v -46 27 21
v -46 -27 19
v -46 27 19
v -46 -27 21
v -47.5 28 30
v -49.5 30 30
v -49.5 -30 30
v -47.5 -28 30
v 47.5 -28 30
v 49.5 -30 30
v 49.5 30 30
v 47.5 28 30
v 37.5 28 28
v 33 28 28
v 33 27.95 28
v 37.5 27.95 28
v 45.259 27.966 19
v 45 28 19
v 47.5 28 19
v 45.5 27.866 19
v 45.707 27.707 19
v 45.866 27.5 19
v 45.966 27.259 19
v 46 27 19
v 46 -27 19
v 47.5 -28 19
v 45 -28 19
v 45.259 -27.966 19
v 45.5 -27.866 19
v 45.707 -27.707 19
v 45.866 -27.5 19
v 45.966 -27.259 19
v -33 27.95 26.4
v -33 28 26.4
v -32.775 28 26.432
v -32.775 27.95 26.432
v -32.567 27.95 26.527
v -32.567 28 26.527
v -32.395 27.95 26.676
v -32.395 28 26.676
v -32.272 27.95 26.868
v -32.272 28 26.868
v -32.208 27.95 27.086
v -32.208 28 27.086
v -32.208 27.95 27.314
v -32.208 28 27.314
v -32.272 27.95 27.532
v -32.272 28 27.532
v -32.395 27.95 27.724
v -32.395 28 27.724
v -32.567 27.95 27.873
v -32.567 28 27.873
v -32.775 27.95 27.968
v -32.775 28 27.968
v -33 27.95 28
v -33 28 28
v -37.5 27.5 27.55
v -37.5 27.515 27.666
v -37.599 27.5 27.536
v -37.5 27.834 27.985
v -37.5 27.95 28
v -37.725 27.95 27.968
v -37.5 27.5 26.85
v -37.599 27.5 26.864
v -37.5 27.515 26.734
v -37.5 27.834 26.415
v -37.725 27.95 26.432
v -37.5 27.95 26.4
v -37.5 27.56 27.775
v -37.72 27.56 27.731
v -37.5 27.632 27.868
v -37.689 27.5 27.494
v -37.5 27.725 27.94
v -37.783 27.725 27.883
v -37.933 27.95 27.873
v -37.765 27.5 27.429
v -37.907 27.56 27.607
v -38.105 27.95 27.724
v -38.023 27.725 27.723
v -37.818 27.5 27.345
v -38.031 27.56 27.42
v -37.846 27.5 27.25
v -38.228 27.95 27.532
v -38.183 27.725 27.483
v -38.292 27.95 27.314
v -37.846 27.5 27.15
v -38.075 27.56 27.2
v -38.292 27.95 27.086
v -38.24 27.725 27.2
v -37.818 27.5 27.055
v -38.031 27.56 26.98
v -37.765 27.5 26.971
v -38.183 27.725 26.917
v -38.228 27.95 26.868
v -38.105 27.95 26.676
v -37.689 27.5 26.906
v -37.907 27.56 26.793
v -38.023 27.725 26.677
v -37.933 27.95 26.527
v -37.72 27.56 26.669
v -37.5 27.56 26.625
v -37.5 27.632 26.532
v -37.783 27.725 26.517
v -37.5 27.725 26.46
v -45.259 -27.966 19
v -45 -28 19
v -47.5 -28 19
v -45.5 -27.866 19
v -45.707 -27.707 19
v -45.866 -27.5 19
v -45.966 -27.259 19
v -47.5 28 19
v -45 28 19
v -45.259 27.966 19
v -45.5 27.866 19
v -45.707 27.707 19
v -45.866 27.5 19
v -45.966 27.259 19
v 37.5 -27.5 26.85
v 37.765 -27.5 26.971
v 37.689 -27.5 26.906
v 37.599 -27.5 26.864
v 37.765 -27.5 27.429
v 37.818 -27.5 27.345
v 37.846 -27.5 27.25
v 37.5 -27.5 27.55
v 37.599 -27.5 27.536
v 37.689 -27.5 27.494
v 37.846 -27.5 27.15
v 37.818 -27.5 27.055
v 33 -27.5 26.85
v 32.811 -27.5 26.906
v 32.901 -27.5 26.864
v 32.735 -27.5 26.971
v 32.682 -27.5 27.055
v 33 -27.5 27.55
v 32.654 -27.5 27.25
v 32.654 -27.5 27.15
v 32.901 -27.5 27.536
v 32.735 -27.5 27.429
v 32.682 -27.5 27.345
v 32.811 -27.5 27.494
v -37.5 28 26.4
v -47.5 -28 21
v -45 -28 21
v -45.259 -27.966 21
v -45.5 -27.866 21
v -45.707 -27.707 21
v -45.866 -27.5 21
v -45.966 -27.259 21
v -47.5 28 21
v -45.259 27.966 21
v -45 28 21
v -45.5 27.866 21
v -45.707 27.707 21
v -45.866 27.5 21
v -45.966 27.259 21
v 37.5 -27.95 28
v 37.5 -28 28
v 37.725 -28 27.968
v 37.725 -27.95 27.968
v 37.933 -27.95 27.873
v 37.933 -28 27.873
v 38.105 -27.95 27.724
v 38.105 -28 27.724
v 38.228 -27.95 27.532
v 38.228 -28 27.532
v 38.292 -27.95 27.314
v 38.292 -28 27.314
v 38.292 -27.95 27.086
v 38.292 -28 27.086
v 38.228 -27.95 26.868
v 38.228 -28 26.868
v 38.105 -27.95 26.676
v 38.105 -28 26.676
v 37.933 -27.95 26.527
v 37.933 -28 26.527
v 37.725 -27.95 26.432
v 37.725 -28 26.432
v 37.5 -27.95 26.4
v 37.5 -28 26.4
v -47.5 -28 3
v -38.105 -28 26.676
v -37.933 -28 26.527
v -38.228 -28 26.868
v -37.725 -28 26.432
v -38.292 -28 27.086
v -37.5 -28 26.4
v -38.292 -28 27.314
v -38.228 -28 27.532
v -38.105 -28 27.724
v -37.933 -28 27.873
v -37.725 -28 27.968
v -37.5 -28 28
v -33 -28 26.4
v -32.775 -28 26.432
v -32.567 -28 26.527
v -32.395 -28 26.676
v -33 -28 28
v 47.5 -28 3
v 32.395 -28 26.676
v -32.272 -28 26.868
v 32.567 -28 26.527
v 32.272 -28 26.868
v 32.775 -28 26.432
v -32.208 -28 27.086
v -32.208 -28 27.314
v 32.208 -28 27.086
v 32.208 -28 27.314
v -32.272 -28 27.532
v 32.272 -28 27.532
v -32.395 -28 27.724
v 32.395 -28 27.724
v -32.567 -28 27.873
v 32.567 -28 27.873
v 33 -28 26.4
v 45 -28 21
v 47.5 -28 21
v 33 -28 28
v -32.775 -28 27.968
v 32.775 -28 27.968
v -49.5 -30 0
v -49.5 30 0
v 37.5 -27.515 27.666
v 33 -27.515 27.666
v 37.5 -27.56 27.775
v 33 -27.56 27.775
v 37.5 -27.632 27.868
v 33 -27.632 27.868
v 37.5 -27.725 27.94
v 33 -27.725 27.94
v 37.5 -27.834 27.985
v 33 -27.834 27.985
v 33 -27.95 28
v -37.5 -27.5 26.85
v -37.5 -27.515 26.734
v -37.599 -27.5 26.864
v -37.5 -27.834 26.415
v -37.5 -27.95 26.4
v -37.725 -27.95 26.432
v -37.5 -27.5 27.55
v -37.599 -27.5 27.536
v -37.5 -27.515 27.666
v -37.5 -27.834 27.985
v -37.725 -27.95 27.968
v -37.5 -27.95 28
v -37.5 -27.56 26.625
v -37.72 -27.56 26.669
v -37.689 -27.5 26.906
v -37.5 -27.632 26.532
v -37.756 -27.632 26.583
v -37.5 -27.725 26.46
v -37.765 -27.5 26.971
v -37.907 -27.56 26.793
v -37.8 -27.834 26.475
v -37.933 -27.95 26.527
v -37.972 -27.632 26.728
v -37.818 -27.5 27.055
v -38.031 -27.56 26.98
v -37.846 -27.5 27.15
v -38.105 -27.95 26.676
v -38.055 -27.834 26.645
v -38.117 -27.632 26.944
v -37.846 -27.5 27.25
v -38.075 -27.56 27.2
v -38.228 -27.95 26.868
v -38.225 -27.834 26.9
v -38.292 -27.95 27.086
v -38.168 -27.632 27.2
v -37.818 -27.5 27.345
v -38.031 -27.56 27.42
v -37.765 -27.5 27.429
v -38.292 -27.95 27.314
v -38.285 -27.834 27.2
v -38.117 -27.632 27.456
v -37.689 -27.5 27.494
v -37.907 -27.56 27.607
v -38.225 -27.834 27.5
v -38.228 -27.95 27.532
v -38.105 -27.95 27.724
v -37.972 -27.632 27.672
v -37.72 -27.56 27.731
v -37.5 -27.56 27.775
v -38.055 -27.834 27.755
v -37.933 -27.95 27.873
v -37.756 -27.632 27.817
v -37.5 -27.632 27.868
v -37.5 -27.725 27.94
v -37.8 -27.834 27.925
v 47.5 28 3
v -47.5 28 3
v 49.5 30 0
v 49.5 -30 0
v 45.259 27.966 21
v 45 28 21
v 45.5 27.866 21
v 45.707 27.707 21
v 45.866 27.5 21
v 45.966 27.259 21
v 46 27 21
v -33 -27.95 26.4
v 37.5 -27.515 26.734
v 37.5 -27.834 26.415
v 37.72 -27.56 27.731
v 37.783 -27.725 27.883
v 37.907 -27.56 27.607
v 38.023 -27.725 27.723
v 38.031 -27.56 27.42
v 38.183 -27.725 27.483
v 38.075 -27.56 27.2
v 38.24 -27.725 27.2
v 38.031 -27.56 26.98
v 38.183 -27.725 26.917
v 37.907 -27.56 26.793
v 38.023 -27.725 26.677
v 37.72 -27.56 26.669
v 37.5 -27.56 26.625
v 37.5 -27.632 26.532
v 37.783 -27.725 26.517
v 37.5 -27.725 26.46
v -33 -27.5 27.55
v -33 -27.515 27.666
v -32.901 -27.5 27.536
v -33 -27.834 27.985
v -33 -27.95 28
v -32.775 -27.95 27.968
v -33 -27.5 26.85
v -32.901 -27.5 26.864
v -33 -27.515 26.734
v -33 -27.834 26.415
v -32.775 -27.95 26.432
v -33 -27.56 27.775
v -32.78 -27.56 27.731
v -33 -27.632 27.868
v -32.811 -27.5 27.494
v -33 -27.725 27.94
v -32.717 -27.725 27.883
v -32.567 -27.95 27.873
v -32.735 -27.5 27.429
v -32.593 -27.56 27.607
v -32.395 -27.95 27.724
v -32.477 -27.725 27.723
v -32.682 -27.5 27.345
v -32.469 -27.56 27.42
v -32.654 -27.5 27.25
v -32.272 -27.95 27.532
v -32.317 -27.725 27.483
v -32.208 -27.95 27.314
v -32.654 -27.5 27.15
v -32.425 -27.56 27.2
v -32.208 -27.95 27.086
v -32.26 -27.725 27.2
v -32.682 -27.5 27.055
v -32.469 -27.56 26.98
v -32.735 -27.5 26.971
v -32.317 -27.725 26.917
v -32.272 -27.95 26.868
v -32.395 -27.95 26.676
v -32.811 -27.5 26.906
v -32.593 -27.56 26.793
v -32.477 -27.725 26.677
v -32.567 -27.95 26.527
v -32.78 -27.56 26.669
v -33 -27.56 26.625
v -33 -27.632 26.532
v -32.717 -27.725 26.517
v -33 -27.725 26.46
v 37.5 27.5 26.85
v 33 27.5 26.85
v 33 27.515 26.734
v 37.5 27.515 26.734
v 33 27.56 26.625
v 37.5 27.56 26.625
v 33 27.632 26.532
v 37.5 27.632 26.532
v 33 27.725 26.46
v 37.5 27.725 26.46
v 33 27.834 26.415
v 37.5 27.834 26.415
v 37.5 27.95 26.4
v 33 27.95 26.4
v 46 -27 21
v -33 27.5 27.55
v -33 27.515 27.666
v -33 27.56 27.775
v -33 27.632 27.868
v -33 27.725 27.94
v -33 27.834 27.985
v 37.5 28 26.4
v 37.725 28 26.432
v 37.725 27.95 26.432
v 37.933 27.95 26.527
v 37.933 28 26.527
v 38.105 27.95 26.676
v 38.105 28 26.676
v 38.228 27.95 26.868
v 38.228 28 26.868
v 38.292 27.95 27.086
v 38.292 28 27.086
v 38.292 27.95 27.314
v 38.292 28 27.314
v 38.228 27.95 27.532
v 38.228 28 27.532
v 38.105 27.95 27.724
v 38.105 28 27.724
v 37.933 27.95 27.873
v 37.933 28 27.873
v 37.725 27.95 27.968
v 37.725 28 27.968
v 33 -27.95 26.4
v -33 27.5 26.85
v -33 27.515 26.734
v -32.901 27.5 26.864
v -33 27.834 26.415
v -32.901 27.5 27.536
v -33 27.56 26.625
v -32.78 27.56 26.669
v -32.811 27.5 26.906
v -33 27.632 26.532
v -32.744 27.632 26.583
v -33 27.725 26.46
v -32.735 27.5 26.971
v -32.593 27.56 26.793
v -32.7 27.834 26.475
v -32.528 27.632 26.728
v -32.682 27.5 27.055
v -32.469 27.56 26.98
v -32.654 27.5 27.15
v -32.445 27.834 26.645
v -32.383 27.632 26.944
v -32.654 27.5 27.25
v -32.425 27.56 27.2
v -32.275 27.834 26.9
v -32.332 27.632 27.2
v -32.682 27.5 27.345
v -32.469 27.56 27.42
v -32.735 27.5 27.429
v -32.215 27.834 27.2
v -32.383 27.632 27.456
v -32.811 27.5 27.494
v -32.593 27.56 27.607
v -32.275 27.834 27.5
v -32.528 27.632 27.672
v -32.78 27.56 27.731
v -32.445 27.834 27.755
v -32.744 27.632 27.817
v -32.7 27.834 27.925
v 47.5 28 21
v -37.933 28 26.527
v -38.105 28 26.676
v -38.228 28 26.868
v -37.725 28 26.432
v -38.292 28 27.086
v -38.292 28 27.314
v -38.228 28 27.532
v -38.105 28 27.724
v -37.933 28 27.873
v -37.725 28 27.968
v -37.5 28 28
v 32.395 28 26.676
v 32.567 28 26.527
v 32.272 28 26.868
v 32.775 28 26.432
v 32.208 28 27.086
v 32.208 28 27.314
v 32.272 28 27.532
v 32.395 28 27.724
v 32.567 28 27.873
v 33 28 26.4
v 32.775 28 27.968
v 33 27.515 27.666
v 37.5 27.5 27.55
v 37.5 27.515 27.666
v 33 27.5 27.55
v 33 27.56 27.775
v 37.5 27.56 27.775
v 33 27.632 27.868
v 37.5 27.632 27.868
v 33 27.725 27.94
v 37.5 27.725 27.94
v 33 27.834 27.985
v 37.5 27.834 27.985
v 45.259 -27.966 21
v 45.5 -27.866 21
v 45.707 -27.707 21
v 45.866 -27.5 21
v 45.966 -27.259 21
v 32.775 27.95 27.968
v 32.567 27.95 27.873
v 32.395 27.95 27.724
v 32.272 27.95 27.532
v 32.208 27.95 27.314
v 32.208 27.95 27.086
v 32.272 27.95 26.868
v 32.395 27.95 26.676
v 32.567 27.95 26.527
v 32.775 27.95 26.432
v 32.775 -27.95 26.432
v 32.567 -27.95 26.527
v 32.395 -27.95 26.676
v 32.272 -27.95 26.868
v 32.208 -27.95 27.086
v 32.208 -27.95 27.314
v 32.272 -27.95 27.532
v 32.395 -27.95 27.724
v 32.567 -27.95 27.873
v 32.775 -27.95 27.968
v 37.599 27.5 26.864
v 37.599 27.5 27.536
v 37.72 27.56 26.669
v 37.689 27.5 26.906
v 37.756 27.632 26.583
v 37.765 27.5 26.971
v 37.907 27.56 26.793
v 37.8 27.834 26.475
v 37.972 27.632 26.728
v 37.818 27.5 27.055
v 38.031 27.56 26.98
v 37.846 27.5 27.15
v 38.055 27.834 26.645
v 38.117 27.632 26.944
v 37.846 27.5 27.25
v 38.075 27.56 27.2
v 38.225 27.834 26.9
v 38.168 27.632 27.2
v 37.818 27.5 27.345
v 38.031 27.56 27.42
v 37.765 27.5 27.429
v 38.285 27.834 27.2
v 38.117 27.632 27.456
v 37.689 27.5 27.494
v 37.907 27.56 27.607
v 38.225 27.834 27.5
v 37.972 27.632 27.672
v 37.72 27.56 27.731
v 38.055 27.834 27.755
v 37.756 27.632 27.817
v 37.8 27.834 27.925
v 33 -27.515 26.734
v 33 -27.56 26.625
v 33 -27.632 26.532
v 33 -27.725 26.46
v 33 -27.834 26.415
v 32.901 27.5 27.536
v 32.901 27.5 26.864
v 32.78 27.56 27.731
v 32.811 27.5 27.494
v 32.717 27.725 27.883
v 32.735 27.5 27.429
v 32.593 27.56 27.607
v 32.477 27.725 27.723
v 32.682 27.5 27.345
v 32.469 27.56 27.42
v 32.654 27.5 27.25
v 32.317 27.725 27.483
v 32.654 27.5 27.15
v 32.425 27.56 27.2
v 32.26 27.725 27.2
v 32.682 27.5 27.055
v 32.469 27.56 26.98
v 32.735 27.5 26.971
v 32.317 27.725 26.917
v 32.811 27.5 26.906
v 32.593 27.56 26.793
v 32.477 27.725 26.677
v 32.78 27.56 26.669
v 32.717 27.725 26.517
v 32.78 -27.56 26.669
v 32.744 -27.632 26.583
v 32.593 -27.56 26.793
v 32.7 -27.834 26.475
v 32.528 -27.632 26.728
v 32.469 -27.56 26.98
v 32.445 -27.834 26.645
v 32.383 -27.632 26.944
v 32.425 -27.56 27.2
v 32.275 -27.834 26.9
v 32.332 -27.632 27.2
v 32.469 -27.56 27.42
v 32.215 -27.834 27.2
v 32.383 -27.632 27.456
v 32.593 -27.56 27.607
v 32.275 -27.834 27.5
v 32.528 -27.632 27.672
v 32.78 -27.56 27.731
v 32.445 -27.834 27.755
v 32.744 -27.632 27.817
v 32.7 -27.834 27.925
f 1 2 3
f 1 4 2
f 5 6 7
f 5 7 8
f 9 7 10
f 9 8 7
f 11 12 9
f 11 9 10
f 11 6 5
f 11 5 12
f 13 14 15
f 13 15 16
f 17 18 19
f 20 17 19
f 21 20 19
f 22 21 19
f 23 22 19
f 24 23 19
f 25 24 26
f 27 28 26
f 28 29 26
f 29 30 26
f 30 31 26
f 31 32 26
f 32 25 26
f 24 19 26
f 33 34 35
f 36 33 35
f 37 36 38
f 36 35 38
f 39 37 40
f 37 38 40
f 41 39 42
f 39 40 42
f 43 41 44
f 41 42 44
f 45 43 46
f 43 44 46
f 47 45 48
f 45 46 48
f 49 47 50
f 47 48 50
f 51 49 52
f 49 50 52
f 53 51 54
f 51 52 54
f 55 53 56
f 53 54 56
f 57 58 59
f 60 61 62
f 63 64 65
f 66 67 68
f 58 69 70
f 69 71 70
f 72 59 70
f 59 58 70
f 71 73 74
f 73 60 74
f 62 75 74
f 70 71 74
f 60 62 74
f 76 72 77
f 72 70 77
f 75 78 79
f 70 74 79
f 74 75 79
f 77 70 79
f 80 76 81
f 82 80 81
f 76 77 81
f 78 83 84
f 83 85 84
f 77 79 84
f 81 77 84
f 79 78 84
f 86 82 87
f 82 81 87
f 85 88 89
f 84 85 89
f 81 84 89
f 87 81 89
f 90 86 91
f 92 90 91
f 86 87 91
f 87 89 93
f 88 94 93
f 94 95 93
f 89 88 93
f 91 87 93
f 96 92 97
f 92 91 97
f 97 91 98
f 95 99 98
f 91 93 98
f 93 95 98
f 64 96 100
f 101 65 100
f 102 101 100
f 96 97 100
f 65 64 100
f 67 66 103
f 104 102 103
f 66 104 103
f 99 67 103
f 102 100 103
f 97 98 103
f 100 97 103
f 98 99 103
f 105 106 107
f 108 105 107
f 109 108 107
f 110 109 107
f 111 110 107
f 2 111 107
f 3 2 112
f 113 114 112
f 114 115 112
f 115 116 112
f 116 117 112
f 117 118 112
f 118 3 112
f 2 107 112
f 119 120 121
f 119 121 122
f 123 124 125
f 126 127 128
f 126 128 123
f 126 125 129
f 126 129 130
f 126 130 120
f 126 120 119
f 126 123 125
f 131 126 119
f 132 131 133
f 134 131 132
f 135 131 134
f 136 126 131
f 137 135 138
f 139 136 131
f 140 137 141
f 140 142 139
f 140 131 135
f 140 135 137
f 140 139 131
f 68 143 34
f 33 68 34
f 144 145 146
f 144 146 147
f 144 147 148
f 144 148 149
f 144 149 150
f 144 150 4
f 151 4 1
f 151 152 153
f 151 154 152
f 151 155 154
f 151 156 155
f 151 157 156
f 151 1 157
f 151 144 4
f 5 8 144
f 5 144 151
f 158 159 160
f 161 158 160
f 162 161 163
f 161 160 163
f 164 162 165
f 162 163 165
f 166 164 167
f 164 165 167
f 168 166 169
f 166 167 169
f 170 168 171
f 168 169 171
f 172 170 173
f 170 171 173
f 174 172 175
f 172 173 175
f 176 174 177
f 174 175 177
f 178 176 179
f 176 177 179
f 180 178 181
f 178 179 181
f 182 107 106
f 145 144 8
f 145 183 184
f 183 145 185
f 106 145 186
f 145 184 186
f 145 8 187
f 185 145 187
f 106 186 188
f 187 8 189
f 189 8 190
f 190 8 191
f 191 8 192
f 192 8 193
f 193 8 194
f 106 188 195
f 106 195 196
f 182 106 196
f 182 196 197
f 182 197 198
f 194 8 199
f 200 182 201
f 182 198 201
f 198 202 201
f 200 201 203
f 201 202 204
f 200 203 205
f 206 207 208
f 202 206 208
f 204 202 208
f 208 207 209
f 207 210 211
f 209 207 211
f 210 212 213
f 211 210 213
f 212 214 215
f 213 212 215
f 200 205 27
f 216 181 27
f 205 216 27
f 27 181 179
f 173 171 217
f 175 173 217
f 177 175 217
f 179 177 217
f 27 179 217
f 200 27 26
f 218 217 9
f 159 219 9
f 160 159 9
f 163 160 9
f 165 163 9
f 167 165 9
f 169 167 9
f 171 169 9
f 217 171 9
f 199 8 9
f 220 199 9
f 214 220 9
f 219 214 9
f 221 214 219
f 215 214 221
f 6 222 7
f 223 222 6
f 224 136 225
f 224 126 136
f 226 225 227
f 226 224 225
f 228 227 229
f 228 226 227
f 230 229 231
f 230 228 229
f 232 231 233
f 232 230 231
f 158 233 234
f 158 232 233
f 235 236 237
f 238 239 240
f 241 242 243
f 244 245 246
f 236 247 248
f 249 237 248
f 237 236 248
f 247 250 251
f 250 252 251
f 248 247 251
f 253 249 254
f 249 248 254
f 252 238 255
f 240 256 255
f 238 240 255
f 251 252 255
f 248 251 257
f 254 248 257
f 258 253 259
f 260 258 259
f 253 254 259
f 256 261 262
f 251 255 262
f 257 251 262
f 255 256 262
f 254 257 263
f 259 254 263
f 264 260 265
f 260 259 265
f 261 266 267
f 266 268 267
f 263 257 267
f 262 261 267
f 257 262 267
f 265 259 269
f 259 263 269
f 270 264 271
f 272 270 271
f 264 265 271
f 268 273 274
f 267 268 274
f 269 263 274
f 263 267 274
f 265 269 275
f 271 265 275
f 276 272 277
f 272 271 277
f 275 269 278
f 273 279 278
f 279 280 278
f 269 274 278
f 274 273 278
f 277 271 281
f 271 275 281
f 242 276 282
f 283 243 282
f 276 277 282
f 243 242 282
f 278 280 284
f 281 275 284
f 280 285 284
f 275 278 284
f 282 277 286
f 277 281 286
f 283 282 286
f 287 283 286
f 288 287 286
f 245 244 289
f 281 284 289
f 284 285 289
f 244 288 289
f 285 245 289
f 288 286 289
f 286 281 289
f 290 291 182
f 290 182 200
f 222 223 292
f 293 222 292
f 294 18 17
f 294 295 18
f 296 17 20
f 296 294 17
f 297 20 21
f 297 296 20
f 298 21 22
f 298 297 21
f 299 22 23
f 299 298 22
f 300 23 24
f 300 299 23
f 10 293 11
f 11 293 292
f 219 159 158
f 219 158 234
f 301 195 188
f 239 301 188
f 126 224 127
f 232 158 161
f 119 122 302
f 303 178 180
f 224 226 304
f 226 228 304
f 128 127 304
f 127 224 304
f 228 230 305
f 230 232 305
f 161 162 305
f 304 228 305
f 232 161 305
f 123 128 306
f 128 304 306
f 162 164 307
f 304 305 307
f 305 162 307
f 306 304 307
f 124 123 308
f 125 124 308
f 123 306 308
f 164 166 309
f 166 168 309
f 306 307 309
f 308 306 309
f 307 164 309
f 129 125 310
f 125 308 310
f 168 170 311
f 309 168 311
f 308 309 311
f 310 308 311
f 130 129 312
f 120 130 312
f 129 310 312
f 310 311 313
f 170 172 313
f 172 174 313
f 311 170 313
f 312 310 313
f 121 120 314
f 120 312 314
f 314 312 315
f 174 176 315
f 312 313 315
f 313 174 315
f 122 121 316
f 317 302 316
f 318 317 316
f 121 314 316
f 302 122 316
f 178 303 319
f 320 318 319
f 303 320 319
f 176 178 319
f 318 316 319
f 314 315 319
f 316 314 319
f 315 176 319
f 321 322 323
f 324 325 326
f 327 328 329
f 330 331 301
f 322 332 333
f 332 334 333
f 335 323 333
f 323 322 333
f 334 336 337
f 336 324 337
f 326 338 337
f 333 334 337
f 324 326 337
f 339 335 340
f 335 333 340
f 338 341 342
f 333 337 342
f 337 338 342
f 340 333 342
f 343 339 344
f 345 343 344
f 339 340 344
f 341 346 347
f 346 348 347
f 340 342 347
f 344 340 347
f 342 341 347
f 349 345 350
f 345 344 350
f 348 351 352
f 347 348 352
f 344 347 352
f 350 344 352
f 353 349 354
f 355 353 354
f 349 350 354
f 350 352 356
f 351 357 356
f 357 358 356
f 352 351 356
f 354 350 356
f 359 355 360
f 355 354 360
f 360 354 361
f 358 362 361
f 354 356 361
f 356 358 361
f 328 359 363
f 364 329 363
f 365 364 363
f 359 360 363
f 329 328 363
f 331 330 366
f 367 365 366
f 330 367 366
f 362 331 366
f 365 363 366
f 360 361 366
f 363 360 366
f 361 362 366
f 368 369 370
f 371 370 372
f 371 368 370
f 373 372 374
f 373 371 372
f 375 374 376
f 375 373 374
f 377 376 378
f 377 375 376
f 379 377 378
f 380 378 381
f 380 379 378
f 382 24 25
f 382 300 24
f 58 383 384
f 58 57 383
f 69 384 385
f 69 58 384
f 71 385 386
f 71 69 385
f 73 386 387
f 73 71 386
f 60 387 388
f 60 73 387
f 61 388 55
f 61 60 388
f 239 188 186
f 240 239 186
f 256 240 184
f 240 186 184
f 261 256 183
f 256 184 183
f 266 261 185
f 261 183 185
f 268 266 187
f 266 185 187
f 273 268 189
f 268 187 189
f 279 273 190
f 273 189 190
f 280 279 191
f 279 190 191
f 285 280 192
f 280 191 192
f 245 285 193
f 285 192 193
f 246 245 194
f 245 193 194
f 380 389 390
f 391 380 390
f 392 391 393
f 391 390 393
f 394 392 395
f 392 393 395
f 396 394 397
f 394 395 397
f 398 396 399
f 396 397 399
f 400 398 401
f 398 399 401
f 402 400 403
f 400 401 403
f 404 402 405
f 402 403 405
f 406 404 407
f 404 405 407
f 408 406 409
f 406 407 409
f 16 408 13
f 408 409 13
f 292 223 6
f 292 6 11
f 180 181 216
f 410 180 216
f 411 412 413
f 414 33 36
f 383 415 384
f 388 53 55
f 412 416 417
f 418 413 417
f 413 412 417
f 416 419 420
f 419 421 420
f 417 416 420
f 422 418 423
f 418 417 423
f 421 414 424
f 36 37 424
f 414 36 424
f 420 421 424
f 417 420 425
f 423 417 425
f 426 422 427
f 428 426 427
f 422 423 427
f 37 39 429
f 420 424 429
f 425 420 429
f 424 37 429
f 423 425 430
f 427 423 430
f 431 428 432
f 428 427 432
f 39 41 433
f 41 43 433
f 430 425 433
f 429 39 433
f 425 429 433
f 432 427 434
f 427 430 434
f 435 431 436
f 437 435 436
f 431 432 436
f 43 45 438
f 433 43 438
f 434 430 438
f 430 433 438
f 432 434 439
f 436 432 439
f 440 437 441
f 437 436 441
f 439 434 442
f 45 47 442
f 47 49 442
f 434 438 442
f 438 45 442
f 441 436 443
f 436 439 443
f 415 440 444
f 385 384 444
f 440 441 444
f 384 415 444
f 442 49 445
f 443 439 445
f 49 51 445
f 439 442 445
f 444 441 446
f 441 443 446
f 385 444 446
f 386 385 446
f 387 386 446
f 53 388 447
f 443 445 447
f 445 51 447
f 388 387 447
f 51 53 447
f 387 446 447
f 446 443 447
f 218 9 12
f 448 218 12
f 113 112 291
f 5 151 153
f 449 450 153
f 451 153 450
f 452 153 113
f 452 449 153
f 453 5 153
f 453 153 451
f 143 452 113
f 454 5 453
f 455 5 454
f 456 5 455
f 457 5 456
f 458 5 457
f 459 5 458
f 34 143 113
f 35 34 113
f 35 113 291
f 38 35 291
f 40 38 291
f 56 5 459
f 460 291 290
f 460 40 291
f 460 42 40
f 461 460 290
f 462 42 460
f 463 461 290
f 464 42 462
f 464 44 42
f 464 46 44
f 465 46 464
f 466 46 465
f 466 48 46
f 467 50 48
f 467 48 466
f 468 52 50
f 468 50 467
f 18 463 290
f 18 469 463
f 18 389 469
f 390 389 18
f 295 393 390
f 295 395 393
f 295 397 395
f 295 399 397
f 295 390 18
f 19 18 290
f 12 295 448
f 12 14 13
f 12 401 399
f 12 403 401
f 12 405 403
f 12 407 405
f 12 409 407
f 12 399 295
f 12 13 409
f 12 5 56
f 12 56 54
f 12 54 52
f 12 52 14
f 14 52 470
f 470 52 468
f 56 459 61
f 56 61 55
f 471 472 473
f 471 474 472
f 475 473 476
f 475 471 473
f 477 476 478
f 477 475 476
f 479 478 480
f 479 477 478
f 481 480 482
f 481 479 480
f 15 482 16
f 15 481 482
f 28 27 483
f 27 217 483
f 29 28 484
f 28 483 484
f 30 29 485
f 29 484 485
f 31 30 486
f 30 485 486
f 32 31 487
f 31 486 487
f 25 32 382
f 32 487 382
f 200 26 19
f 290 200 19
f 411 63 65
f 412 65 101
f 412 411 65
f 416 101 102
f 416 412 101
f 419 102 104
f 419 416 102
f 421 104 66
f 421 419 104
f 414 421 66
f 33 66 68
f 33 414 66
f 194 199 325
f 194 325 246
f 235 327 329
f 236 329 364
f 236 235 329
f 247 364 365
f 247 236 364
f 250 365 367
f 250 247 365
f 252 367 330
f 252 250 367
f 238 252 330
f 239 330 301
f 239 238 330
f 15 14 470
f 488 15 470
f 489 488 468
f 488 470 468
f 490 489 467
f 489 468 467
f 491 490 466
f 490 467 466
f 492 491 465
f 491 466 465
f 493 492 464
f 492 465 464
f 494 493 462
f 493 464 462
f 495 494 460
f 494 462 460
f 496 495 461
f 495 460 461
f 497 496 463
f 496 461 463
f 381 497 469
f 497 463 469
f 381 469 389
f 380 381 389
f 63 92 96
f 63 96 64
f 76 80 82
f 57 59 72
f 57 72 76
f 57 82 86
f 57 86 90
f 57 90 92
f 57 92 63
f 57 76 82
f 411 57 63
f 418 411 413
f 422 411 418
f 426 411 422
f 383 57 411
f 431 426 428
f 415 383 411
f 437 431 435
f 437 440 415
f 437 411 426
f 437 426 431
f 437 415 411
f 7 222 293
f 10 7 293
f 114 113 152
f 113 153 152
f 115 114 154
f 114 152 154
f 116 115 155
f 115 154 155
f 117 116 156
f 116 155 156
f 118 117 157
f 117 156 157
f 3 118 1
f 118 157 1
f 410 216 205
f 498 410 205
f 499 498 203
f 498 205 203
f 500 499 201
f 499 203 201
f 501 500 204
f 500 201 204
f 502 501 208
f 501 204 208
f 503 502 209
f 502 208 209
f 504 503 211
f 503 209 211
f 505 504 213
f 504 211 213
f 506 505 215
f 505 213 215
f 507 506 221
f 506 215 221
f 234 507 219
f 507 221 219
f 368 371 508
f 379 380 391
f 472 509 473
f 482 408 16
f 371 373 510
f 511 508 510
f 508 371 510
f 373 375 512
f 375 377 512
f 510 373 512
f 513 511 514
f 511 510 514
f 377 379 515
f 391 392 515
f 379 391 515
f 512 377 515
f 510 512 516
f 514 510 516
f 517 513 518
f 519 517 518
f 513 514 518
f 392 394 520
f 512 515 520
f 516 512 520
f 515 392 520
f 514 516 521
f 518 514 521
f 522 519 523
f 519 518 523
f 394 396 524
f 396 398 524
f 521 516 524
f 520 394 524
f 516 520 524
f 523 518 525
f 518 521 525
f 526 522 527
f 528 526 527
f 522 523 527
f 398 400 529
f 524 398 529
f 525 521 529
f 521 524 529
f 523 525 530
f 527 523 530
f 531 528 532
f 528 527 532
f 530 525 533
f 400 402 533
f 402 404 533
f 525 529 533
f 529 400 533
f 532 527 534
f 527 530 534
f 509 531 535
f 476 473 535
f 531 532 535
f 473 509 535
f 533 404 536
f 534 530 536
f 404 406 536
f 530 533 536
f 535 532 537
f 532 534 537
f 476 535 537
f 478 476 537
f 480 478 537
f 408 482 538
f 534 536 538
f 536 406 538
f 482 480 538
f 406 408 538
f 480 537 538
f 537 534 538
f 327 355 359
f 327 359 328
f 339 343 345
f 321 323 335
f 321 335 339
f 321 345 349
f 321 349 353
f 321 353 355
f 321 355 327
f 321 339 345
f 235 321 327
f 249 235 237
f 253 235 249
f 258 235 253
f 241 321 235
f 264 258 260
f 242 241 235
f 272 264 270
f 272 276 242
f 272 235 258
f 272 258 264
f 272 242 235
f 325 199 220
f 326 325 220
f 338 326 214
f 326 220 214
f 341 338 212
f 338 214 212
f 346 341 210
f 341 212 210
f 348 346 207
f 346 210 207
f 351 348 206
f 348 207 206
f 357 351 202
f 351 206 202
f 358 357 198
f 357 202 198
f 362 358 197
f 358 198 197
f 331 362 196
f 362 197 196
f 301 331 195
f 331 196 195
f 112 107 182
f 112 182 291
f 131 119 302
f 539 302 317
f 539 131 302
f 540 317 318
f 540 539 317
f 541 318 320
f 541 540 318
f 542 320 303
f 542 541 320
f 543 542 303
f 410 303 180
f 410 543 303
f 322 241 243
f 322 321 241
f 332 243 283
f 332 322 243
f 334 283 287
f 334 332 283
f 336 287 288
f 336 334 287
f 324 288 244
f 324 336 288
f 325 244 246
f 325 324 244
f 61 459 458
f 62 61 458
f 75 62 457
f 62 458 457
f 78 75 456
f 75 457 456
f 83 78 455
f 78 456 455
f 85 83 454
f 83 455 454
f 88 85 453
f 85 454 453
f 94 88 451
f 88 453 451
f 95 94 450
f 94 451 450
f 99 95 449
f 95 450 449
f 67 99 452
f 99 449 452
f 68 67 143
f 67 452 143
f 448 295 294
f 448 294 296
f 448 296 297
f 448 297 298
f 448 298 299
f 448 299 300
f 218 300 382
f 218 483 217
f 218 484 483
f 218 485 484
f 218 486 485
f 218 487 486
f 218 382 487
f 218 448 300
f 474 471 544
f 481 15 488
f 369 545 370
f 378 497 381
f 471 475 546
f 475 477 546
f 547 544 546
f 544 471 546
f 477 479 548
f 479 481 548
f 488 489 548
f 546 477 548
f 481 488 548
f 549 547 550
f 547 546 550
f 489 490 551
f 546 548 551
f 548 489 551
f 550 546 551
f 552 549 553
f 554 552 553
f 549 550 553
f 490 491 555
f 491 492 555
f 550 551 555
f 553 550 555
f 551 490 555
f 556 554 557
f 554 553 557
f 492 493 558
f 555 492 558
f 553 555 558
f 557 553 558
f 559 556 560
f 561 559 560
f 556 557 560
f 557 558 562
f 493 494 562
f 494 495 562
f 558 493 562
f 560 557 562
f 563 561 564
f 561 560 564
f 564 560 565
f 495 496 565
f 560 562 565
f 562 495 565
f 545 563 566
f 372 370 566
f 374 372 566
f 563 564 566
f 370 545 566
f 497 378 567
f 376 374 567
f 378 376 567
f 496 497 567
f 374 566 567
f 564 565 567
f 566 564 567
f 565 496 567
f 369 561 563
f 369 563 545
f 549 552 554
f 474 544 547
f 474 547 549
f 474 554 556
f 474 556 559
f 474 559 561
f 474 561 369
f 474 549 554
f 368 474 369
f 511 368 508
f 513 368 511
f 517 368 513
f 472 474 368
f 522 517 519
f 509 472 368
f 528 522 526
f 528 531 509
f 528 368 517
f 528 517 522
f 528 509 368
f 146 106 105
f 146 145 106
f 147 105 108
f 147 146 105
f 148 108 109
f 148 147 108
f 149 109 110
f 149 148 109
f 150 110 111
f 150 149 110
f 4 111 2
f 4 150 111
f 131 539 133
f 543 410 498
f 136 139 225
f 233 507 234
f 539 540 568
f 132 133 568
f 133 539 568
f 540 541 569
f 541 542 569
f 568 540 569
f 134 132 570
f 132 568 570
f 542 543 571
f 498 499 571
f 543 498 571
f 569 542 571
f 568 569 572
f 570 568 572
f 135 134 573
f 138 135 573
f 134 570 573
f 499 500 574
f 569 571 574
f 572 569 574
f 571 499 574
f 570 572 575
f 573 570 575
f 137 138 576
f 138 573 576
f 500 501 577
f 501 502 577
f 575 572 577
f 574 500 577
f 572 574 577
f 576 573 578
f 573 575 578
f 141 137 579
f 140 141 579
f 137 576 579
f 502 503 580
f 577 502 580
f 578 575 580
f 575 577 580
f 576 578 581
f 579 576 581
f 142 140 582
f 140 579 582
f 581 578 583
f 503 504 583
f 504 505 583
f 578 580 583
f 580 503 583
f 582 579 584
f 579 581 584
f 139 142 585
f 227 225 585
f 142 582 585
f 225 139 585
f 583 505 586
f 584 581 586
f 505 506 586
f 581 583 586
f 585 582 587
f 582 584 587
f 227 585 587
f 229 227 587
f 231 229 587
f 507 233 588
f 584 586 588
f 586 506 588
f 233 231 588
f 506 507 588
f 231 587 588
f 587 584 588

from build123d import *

# Parameters (mm, degrees)
SKETCH003_W     = 99
SKETCH003_H     = 60
PAD002_DEPTH    = 30
SKETCH004_W     = 95
SKETCH004_H     = 56
POCKET001_DEPTH = 27
PAD003_DEPTH    = 0.5
PAD004_DEPTH    = 0.5
SKETCH007_W     = 56
SKETCH007_H     = 2
PAD005_DEPTH    = 1.5
SKETCH008_W     = 56
SKETCH008_H     = 2
PAD006_DEPTH    = 1.5
FILLET_R        = 1
FILLET001_R     = 0.45


with BuildPart() as part:
    # Sketch003 → Pad002 (new body)
    with BuildSketch(Plane.XY):
        Rectangle(SKETCH003_W, SKETCH003_H)
    extrude(amount=PAD002_DEPTH)

    # Sketch004 (on Face6 of Pad002) → Pocket001 (cut)
    with BuildSketch(Plane.XY.offset(30)):
        Rectangle(SKETCH004_W, SKETCH004_H)
    extrude(amount=-POCKET001_DEPTH, mode=Mode.SUBTRACT)

    # Sketch005 (on Face8 of Pocket001) → Pad003 (join)
    with BuildSketch(Plane.XZ.offset(-28)):
        with BuildLine():
            ThreePointArc((-37.5, 28), (-38.3, 27.2), (-37.5, 26.4))
            Line((-37.5, 26.4), (-33, 26.4))
            ThreePointArc((-33, 26.4), (-32.2, 27.2), (-33, 28))
            Line((-37.5, 28), (-33, 28))
        make_face()
        with BuildLine():
            ThreePointArc((33, 28), (32.2, 27.2), (33, 26.4))
            Line((33, 26.4), (37.5, 26.4))
            ThreePointArc((37.5, 26.4), (38.3, 27.2), (37.5, 28))
            Line((33, 28), (37.5, 28))
        make_face()
    extrude(amount=PAD003_DEPTH)

    # Sketch006 (on Face10 of Pad003) → Pad004 (join)
    with BuildSketch(Plane(origin=(0, -28, 0), x_dir=(-1, 0, 0), z_dir=(0, 1, 0))):
        with BuildLine():
            ThreePointArc((-37.5, 28), (-38.3, 27.2), (-37.5, 26.4))
            Line((-37.5, 26.4), (-33, 26.4))
            ThreePointArc((-33, 26.4), (-32.2, 27.2), (-33, 28))
            Line((-37.5, 28), (-33, 28))
        make_face()
        with BuildLine():
            ThreePointArc((33, 28), (32.2, 27.2), (33, 26.4))
            Line((33, 26.4), (37.5, 26.4))
            ThreePointArc((37.5, 26.4), (38.3, 27.2), (37.5, 28))
            Line((33, 28), (37.5, 28))
        make_face()
    extrude(amount=PAD004_DEPTH)

    # Sketch007 (on Face7 of Pad004) → Pad005 (join)
    with BuildSketch(Plane(origin=(47.5, 0, 0), x_dir=(0, -1, 0), z_dir=(-1, 0, 0))):
        with Locations((0, 20)):
            Rectangle(SKETCH007_W, SKETCH007_H)
    extrude(amount=PAD005_DEPTH)

    # Sketch008 (on Face9 of Pad005) → Pad006 (join)
    with BuildSketch(Plane.YZ.offset(-47.5)):
        with Locations((0, 20)):
            Rectangle(SKETCH008_W, SKETCH008_H)
    extrude(amount=PAD006_DEPTH)

    # Fillet
    fillet_edges = [part.edges().sort_by_distance(p)[0] for p in [
        (-46, 28, 20),
        (-46, -28, 20),
        (46, 28, 20),
        (46, -28, 20),
    ]]
    fillet(fillet_edges, radius=FILLET_R)

    # Fillet001
    fillet001_edges = [part.edges().sort_by_distance(p)[0] for p in [
        (-38.3, 27.5, 27.2),
        (-35.25, 27.5, 26.4),
        (-32.2, 27.5, 27.2),
        (-35.25, 27.5, 28),
        (32.2, 27.5, 27.2),
        (35.25, 27.5, 26.4),
        (38.3, 27.5, 27.2),
        (35.25, 27.5, 28),
        (38.3, -27.5, 27.2),
        (35.25, -27.5, 26.4),
        (32.2, -27.5, 27.2),
        (35.25, -27.5, 28),
        (-32.2, -27.5, 27.2),
        (-35.25, -27.5, 26.4),
        (-38.3, -27.5, 27.2),
        (-35.25, -27.5, 28),
    ]]
    fillet(fillet001_edges, radius=FILLET001_R)


solid = part.part
